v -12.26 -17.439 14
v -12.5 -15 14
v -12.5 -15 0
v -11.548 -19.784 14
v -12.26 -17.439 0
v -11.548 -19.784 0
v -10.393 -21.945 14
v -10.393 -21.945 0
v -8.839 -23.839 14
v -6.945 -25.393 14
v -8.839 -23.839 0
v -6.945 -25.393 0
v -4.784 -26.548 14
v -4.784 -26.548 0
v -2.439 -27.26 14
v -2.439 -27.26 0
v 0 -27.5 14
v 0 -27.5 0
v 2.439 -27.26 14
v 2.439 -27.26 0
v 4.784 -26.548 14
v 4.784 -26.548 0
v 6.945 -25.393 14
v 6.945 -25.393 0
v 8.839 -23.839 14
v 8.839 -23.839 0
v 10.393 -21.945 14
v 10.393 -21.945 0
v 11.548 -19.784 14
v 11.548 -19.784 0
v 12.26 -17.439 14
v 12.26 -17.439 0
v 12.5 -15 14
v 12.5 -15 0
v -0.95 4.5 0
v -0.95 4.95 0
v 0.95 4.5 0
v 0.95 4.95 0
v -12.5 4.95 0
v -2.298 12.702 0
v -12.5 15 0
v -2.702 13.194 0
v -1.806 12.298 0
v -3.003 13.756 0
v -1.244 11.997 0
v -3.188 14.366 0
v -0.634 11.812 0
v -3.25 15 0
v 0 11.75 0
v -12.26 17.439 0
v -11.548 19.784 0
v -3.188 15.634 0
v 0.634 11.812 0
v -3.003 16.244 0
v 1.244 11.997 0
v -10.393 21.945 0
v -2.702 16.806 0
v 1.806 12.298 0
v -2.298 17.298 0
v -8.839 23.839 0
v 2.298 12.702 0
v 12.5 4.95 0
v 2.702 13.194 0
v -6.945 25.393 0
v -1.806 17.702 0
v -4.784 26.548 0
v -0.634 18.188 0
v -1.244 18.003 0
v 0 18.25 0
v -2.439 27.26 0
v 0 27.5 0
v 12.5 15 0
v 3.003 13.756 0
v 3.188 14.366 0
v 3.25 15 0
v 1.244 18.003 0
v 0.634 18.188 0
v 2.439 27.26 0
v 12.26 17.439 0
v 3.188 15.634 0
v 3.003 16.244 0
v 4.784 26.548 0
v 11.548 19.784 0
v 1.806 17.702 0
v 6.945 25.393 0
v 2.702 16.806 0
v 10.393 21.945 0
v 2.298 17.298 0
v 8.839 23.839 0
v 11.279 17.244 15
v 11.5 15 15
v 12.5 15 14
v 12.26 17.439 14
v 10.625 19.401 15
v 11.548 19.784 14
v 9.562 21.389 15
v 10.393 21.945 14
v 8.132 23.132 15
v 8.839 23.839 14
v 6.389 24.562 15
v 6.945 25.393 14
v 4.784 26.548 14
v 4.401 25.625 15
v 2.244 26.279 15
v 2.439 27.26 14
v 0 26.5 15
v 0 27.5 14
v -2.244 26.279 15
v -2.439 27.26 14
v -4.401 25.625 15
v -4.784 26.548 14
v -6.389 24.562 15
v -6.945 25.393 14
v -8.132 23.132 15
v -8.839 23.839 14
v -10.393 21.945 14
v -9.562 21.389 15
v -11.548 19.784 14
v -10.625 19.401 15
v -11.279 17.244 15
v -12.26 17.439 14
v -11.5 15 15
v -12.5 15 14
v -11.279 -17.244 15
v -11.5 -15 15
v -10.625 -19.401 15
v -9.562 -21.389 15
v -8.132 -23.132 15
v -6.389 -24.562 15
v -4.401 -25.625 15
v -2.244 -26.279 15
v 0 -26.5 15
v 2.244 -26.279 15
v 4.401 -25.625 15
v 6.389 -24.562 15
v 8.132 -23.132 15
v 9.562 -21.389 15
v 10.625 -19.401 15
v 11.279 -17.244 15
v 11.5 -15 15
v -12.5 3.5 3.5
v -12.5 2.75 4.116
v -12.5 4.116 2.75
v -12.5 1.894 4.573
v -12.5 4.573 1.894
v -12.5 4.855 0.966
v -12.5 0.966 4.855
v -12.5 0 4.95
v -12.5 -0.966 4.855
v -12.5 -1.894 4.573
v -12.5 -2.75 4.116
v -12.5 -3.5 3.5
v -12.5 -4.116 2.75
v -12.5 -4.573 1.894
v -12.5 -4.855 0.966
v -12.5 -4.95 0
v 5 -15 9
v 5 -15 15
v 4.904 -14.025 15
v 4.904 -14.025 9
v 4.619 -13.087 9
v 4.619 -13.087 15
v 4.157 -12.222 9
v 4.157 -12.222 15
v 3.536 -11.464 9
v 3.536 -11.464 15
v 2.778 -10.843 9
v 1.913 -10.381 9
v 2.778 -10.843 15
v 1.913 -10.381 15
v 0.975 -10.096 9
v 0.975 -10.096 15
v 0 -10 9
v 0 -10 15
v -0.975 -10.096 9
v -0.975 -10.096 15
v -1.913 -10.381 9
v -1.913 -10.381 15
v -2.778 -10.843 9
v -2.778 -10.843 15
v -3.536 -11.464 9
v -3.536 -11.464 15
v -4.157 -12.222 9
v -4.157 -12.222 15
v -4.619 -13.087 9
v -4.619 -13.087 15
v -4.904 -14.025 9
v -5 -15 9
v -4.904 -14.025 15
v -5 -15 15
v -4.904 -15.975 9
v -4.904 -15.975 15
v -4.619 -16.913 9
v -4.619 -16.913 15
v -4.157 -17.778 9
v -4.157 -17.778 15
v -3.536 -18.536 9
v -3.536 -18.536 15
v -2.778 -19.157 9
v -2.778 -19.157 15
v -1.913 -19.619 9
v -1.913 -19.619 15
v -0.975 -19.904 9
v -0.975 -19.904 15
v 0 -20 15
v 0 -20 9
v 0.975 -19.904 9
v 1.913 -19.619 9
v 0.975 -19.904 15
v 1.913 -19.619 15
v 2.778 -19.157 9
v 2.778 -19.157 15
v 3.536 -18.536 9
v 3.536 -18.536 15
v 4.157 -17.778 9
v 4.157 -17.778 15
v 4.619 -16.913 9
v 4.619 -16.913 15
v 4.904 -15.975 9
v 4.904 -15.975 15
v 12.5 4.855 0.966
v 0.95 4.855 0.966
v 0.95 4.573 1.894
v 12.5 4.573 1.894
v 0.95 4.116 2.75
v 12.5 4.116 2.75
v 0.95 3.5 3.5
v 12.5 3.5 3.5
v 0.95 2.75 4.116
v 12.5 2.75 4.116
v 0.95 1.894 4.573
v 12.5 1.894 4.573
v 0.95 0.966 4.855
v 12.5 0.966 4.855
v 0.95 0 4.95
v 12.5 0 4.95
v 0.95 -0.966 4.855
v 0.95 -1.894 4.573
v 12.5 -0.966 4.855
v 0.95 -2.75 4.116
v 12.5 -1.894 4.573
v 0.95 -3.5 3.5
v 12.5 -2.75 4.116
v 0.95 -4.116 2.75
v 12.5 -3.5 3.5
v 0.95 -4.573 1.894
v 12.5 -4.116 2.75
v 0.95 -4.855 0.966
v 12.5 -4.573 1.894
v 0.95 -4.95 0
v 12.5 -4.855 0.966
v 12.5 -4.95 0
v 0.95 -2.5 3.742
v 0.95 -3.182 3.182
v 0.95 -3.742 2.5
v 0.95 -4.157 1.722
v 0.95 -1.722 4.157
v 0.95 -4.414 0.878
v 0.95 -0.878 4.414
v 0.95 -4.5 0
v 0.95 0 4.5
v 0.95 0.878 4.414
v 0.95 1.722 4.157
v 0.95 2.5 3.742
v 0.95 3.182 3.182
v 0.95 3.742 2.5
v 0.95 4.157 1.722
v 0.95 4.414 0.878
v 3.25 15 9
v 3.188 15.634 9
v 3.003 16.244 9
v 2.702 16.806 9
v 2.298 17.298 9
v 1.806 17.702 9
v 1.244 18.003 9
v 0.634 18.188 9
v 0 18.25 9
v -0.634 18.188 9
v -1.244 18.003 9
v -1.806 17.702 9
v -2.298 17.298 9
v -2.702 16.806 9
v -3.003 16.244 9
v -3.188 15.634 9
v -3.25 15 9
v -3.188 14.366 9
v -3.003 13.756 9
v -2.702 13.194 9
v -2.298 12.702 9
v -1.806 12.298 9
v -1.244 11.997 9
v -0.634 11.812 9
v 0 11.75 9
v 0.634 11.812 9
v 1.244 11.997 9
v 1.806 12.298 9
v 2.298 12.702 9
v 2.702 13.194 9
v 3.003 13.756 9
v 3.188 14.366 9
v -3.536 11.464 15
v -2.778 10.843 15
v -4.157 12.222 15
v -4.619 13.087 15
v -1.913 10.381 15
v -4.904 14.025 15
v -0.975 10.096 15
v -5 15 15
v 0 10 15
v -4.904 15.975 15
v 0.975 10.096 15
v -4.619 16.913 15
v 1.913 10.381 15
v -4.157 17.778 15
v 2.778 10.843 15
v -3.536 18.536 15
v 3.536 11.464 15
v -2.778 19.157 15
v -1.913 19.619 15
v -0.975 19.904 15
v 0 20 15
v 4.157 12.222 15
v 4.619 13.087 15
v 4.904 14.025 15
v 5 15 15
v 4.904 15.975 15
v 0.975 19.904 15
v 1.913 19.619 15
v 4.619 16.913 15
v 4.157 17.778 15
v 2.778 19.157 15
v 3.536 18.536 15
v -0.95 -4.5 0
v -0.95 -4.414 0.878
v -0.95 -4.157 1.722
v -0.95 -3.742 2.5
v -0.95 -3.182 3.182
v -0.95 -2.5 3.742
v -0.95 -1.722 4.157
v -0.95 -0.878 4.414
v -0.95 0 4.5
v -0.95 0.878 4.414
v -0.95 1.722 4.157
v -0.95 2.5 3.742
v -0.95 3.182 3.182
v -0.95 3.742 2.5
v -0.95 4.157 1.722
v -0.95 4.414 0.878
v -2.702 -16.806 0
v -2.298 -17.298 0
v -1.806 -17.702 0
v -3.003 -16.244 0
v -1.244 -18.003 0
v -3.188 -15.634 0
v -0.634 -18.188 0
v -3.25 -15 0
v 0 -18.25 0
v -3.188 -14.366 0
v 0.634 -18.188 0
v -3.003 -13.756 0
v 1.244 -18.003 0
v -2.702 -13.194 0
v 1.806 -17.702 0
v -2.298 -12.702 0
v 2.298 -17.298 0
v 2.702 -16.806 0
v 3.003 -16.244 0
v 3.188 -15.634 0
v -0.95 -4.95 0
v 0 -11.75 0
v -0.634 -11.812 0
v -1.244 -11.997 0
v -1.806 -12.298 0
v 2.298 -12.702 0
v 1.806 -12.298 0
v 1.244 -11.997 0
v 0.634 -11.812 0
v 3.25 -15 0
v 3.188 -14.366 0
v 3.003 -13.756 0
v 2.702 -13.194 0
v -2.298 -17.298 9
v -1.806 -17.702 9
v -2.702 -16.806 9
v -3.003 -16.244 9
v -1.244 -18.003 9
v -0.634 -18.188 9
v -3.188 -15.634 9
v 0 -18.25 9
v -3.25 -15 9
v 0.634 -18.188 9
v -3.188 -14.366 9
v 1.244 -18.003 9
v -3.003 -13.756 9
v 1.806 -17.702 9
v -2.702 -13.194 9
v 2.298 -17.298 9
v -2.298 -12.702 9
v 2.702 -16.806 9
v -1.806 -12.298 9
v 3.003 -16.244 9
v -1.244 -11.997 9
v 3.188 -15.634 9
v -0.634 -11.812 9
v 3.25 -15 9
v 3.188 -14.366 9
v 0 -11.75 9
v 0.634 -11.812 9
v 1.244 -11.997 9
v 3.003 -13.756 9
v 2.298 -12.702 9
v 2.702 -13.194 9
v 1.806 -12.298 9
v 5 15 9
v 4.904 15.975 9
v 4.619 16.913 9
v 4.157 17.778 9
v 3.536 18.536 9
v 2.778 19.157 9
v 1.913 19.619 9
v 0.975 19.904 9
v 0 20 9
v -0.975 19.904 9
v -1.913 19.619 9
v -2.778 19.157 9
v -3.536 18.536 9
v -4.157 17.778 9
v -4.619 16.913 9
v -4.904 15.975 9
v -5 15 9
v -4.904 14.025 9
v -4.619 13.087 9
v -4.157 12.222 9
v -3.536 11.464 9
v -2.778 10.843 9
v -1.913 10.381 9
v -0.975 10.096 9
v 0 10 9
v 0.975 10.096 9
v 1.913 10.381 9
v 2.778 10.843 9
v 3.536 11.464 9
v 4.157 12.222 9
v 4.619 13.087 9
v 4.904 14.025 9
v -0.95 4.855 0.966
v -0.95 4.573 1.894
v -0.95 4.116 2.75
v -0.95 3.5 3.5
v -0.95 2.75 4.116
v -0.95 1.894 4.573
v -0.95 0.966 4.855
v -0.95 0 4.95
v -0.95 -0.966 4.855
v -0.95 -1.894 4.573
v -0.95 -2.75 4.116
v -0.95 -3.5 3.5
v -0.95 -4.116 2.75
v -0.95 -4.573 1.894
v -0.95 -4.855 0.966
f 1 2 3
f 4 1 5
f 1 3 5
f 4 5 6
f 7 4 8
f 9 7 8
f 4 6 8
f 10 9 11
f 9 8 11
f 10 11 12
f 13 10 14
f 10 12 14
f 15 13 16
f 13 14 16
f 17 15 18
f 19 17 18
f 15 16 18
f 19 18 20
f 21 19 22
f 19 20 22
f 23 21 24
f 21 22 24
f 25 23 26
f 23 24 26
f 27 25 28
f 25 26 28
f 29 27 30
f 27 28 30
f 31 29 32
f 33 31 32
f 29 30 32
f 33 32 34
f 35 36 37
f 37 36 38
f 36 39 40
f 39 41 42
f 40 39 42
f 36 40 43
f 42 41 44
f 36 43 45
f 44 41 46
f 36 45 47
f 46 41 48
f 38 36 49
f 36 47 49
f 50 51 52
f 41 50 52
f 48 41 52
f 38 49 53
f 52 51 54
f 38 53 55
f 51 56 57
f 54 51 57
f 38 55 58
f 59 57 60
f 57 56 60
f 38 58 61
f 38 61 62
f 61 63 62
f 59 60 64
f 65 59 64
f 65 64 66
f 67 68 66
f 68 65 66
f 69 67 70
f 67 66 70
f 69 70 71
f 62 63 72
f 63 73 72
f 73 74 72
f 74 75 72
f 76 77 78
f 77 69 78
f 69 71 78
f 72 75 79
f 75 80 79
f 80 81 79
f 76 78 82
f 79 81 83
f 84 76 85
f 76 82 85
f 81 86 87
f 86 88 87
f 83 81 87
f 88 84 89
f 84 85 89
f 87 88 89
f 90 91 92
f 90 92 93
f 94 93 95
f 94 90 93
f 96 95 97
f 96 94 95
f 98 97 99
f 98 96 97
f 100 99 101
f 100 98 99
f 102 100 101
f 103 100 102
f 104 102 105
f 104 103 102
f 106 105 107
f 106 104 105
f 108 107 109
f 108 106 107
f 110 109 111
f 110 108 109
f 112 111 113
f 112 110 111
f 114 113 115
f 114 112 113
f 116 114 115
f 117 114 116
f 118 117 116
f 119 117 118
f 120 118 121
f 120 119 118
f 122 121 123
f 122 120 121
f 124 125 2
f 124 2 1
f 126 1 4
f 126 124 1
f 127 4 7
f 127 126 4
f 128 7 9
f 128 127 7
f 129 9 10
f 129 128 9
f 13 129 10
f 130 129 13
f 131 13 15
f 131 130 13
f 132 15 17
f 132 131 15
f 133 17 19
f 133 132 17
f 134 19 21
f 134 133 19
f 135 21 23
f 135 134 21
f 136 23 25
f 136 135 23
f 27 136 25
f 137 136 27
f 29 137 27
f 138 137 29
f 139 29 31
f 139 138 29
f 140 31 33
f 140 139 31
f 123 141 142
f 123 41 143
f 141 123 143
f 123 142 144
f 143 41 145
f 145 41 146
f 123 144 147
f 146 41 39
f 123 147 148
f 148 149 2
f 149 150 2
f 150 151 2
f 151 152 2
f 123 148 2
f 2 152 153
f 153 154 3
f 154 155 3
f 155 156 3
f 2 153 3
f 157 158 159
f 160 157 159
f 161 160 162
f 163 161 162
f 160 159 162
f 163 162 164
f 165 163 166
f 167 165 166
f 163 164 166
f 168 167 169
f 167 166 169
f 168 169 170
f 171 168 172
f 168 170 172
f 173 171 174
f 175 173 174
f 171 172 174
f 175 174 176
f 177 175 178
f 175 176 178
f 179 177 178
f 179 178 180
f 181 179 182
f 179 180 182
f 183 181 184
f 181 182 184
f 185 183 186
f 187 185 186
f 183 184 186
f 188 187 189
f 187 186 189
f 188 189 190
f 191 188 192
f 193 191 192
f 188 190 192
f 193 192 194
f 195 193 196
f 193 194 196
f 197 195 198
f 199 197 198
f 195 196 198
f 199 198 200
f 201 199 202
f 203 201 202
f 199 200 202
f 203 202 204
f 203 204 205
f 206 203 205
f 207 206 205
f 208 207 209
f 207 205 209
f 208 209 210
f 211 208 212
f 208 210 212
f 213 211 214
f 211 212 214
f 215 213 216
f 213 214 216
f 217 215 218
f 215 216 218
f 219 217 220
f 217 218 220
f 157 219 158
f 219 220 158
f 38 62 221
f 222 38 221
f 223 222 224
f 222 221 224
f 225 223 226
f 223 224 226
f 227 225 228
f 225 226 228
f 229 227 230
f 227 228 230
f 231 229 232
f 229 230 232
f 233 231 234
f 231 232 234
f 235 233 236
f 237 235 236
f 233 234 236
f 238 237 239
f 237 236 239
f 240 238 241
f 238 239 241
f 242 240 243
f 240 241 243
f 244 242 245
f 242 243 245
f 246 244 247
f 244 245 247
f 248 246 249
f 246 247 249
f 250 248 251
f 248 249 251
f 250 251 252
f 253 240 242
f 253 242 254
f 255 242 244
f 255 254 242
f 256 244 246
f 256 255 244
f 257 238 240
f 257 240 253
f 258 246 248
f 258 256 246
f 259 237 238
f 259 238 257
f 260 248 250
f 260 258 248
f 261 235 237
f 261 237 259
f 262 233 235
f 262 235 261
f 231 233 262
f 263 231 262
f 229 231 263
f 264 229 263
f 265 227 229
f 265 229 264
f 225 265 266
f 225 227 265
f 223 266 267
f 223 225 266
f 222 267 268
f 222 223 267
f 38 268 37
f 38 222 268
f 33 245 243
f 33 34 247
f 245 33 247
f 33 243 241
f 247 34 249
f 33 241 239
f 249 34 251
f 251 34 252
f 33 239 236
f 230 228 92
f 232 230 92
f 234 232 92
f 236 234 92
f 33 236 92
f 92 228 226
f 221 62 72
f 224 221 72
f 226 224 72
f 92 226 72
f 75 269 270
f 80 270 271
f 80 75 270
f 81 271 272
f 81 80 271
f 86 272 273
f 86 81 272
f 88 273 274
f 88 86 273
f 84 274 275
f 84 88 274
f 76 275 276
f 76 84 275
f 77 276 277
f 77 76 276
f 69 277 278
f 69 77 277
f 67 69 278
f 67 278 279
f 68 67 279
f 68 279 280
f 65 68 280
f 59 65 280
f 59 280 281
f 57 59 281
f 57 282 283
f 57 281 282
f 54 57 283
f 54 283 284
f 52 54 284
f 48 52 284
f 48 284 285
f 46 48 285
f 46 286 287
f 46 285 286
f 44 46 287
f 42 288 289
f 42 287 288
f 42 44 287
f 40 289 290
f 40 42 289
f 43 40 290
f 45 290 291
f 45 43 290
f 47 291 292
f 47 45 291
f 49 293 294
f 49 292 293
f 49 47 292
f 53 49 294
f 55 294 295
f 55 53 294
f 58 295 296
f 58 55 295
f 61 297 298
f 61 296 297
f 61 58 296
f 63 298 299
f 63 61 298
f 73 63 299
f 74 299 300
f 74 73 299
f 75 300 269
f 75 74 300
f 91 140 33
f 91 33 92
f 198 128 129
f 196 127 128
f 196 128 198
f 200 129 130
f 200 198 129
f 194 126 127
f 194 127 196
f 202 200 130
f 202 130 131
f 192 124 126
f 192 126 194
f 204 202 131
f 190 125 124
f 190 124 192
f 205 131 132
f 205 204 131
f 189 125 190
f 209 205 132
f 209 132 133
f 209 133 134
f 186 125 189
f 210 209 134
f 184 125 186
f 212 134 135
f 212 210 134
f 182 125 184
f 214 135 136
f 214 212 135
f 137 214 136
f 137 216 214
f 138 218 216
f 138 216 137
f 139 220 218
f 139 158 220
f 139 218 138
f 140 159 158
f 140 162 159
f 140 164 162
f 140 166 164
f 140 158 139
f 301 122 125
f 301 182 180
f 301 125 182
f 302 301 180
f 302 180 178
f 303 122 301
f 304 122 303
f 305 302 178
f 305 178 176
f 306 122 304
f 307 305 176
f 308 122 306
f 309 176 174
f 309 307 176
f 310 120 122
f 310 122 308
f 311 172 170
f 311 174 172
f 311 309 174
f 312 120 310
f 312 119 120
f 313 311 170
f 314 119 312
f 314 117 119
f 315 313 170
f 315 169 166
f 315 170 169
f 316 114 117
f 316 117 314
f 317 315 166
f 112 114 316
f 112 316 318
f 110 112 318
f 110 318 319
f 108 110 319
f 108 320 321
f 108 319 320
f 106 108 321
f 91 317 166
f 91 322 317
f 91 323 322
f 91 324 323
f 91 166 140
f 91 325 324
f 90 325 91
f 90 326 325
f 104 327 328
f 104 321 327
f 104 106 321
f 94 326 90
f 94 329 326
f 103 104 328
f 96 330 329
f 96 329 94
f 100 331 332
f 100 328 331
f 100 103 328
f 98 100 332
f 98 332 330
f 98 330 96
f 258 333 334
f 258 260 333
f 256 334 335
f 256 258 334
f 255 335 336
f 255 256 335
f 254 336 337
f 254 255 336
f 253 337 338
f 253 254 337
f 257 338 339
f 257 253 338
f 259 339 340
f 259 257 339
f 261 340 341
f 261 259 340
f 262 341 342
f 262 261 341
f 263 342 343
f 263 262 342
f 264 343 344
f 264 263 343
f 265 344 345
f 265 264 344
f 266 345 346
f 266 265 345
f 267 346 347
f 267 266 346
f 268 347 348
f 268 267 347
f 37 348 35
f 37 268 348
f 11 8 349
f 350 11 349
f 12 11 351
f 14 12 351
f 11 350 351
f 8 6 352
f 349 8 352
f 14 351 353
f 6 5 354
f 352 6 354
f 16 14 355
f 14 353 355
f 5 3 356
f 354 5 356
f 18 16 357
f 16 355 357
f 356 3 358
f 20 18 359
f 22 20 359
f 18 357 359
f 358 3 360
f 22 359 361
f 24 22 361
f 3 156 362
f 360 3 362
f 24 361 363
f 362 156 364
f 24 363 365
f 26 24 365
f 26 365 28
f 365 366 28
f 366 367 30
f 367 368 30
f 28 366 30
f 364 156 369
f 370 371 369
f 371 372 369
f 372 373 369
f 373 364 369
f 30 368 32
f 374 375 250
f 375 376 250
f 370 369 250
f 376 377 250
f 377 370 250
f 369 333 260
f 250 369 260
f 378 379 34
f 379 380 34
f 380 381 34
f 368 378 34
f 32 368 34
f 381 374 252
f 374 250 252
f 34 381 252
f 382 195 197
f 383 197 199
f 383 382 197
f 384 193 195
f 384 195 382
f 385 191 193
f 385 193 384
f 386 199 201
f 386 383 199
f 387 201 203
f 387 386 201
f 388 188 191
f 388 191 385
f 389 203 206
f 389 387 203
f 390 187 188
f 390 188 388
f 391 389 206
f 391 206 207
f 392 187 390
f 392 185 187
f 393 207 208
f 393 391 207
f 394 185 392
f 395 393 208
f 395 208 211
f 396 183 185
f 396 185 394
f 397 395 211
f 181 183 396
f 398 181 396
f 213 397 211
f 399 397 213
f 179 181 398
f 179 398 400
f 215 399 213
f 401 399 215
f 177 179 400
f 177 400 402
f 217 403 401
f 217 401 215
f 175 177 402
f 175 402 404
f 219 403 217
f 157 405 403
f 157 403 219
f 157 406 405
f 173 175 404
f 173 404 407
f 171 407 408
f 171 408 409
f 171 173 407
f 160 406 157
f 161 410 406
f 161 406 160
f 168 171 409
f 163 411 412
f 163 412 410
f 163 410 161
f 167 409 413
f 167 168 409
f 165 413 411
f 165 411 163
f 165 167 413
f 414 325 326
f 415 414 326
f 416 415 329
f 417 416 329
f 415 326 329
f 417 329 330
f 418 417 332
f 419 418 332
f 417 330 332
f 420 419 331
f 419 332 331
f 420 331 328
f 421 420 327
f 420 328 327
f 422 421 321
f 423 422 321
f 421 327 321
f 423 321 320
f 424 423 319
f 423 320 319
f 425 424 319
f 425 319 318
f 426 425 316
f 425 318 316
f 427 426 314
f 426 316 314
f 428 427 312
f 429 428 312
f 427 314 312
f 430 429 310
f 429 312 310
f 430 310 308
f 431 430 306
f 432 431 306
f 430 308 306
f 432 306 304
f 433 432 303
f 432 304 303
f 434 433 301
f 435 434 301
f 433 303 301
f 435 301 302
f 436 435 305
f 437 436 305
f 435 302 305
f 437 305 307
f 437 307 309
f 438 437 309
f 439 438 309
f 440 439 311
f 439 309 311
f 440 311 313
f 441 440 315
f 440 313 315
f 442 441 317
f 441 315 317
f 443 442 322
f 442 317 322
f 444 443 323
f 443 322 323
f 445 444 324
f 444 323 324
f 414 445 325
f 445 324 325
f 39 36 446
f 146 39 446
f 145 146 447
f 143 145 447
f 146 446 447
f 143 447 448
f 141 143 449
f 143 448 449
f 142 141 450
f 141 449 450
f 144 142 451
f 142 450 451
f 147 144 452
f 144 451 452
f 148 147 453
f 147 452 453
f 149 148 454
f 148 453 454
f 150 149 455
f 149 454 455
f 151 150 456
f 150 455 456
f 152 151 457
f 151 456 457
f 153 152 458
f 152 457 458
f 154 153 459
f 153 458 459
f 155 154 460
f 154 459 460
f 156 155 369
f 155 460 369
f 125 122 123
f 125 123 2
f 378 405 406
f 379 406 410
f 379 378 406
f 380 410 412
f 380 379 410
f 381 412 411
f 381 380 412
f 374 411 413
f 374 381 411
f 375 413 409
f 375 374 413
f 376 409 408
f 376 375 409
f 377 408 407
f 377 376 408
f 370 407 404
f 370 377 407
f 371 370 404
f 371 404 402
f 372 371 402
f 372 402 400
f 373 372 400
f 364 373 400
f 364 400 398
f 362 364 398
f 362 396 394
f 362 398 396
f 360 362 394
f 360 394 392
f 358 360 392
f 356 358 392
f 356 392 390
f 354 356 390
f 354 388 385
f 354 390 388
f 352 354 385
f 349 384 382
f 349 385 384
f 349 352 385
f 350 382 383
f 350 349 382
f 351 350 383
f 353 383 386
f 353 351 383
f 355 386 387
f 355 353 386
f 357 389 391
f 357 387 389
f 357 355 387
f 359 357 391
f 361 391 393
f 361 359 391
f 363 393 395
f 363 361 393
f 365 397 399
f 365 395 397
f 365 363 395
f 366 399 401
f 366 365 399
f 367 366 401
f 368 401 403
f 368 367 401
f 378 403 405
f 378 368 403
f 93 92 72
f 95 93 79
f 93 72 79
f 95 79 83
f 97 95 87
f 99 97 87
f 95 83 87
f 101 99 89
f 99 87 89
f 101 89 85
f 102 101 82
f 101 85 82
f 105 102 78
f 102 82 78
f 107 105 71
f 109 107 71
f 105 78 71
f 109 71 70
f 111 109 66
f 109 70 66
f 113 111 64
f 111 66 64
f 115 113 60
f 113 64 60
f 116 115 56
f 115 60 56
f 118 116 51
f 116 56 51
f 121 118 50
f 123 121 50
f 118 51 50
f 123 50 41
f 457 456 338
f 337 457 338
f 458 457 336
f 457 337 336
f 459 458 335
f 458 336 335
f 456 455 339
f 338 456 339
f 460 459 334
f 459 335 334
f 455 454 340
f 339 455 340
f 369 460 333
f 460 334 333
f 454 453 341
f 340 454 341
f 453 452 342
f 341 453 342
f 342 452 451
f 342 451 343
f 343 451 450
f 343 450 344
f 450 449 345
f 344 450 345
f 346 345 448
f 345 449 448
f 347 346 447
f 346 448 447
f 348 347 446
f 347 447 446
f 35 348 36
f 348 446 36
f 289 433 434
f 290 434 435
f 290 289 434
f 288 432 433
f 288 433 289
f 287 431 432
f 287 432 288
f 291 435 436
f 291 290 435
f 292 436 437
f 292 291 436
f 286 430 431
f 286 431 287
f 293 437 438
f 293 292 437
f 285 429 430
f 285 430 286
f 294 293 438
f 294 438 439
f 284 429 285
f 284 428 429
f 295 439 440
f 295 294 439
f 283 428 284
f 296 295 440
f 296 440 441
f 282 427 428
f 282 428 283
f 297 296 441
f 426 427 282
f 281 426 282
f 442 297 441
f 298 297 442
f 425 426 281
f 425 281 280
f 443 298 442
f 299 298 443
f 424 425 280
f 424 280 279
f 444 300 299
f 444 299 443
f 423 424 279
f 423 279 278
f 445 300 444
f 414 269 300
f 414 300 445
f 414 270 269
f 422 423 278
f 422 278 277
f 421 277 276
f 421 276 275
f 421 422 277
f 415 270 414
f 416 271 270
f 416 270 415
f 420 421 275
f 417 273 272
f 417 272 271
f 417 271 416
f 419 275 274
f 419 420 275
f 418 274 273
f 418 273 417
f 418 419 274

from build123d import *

# Parameters (mm, degrees)
SKETCH1_R           = 3.25
BOSS_EXTRUDE1_DEPTH = 15
CUT_EXTRUDE1_REACH  = 27
SKETCH2_R           = 4.95
CHAMFER1_SIZE       = 1
SKETCH3_R           = 5
CUT_EXTRUDE2_DEPTH  = 6
BOSS_EXTRUDE2_DEPTH = 0.95


with BuildPart() as part:
    # Sketch1 → Boss-Extrude1 (new body)
    with BuildSketch(Plane.XY):
        with BuildLine():
            Line((-12.5, 15), (-12.5, -15))
            ThreePointArc((-12.5, -15), (0, -27.5), (12.5, -15))
            Line((12.5, -15), (12.5, 15))
            ThreePointArc((12.5, 15), (0, 27.5), (-12.5, 15))
        make_face()
        with Locations((0, 15)):
            Circle(SKETCH1_R, mode=Mode.SUBTRACT)
        with Locations((0, -15)):
            Circle(SKETCH1_R, mode=Mode.SUBTRACT)
    extrude(amount=BOSS_EXTRUDE1_DEPTH)

    # Sketch2 → Cut-Extrude1 (cut, up to next)
    with BuildSketch(Plane(origin=(12.5, 0, 0), x_dir=(0, 0, -1), z_dir=(1, 0, 0)), mode=Mode.PRIVATE) as cut_extrude1_sk1:
        Circle(SKETCH2_R)
    cut_extrude1_tool1 = extrude(cut_extrude1_sk1.sketch, amount=-CUT_EXTRUDE1_REACH, mode=Mode.PRIVATE) & part.part
    add(cut_extrude1_tool1.solids().sort_by_distance((12.5, 0, 0))[0], mode=Mode.SUBTRACT)

    # Chamfer1
    chamfer1_edges = [part.edges().sort_by_distance(p)[0] for p in [
        (-12.5, 0, 15),
        (0, -27.5, 15),
        (12.5, 0, 15),
        (0, 27.5, 15),
    ]]
    chamfer(chamfer1_edges, length=CHAMFER1_SIZE)

    # Sketch3 → Cut-Extrude2 (cut)
    with BuildSketch(Plane.XY.offset(15)):
        with Locations((0, 15)):
            Circle(SKETCH3_R)
        with Locations((0, -15)):
            Circle(SKETCH3_R)
    extrude(amount=-CUT_EXTRUDE2_DEPTH, mode=Mode.SUBTRACT)

    # Sketch5 → Boss-Extrude2 (add, symmetric)
    with BuildSketch(Plane(origin=(0, 0, 0), x_dir=(0, 0, -1), z_dir=(1, 0, 0))):
        with BuildLine():
            Line((0, 4.5), (0, 4.95))
            ThreePointArc((0, 4.95), (-4.95, 0), (0, -4.95))
            Line((0, -4.95), (0, -4.5))
            ThreePointArc((0, -4.5), (-4.5, 0), (0, 4.5))
        make_face()
    extrude(amount=BOSS_EXTRUDE2_DEPTH, both=True)


solid = part.part
